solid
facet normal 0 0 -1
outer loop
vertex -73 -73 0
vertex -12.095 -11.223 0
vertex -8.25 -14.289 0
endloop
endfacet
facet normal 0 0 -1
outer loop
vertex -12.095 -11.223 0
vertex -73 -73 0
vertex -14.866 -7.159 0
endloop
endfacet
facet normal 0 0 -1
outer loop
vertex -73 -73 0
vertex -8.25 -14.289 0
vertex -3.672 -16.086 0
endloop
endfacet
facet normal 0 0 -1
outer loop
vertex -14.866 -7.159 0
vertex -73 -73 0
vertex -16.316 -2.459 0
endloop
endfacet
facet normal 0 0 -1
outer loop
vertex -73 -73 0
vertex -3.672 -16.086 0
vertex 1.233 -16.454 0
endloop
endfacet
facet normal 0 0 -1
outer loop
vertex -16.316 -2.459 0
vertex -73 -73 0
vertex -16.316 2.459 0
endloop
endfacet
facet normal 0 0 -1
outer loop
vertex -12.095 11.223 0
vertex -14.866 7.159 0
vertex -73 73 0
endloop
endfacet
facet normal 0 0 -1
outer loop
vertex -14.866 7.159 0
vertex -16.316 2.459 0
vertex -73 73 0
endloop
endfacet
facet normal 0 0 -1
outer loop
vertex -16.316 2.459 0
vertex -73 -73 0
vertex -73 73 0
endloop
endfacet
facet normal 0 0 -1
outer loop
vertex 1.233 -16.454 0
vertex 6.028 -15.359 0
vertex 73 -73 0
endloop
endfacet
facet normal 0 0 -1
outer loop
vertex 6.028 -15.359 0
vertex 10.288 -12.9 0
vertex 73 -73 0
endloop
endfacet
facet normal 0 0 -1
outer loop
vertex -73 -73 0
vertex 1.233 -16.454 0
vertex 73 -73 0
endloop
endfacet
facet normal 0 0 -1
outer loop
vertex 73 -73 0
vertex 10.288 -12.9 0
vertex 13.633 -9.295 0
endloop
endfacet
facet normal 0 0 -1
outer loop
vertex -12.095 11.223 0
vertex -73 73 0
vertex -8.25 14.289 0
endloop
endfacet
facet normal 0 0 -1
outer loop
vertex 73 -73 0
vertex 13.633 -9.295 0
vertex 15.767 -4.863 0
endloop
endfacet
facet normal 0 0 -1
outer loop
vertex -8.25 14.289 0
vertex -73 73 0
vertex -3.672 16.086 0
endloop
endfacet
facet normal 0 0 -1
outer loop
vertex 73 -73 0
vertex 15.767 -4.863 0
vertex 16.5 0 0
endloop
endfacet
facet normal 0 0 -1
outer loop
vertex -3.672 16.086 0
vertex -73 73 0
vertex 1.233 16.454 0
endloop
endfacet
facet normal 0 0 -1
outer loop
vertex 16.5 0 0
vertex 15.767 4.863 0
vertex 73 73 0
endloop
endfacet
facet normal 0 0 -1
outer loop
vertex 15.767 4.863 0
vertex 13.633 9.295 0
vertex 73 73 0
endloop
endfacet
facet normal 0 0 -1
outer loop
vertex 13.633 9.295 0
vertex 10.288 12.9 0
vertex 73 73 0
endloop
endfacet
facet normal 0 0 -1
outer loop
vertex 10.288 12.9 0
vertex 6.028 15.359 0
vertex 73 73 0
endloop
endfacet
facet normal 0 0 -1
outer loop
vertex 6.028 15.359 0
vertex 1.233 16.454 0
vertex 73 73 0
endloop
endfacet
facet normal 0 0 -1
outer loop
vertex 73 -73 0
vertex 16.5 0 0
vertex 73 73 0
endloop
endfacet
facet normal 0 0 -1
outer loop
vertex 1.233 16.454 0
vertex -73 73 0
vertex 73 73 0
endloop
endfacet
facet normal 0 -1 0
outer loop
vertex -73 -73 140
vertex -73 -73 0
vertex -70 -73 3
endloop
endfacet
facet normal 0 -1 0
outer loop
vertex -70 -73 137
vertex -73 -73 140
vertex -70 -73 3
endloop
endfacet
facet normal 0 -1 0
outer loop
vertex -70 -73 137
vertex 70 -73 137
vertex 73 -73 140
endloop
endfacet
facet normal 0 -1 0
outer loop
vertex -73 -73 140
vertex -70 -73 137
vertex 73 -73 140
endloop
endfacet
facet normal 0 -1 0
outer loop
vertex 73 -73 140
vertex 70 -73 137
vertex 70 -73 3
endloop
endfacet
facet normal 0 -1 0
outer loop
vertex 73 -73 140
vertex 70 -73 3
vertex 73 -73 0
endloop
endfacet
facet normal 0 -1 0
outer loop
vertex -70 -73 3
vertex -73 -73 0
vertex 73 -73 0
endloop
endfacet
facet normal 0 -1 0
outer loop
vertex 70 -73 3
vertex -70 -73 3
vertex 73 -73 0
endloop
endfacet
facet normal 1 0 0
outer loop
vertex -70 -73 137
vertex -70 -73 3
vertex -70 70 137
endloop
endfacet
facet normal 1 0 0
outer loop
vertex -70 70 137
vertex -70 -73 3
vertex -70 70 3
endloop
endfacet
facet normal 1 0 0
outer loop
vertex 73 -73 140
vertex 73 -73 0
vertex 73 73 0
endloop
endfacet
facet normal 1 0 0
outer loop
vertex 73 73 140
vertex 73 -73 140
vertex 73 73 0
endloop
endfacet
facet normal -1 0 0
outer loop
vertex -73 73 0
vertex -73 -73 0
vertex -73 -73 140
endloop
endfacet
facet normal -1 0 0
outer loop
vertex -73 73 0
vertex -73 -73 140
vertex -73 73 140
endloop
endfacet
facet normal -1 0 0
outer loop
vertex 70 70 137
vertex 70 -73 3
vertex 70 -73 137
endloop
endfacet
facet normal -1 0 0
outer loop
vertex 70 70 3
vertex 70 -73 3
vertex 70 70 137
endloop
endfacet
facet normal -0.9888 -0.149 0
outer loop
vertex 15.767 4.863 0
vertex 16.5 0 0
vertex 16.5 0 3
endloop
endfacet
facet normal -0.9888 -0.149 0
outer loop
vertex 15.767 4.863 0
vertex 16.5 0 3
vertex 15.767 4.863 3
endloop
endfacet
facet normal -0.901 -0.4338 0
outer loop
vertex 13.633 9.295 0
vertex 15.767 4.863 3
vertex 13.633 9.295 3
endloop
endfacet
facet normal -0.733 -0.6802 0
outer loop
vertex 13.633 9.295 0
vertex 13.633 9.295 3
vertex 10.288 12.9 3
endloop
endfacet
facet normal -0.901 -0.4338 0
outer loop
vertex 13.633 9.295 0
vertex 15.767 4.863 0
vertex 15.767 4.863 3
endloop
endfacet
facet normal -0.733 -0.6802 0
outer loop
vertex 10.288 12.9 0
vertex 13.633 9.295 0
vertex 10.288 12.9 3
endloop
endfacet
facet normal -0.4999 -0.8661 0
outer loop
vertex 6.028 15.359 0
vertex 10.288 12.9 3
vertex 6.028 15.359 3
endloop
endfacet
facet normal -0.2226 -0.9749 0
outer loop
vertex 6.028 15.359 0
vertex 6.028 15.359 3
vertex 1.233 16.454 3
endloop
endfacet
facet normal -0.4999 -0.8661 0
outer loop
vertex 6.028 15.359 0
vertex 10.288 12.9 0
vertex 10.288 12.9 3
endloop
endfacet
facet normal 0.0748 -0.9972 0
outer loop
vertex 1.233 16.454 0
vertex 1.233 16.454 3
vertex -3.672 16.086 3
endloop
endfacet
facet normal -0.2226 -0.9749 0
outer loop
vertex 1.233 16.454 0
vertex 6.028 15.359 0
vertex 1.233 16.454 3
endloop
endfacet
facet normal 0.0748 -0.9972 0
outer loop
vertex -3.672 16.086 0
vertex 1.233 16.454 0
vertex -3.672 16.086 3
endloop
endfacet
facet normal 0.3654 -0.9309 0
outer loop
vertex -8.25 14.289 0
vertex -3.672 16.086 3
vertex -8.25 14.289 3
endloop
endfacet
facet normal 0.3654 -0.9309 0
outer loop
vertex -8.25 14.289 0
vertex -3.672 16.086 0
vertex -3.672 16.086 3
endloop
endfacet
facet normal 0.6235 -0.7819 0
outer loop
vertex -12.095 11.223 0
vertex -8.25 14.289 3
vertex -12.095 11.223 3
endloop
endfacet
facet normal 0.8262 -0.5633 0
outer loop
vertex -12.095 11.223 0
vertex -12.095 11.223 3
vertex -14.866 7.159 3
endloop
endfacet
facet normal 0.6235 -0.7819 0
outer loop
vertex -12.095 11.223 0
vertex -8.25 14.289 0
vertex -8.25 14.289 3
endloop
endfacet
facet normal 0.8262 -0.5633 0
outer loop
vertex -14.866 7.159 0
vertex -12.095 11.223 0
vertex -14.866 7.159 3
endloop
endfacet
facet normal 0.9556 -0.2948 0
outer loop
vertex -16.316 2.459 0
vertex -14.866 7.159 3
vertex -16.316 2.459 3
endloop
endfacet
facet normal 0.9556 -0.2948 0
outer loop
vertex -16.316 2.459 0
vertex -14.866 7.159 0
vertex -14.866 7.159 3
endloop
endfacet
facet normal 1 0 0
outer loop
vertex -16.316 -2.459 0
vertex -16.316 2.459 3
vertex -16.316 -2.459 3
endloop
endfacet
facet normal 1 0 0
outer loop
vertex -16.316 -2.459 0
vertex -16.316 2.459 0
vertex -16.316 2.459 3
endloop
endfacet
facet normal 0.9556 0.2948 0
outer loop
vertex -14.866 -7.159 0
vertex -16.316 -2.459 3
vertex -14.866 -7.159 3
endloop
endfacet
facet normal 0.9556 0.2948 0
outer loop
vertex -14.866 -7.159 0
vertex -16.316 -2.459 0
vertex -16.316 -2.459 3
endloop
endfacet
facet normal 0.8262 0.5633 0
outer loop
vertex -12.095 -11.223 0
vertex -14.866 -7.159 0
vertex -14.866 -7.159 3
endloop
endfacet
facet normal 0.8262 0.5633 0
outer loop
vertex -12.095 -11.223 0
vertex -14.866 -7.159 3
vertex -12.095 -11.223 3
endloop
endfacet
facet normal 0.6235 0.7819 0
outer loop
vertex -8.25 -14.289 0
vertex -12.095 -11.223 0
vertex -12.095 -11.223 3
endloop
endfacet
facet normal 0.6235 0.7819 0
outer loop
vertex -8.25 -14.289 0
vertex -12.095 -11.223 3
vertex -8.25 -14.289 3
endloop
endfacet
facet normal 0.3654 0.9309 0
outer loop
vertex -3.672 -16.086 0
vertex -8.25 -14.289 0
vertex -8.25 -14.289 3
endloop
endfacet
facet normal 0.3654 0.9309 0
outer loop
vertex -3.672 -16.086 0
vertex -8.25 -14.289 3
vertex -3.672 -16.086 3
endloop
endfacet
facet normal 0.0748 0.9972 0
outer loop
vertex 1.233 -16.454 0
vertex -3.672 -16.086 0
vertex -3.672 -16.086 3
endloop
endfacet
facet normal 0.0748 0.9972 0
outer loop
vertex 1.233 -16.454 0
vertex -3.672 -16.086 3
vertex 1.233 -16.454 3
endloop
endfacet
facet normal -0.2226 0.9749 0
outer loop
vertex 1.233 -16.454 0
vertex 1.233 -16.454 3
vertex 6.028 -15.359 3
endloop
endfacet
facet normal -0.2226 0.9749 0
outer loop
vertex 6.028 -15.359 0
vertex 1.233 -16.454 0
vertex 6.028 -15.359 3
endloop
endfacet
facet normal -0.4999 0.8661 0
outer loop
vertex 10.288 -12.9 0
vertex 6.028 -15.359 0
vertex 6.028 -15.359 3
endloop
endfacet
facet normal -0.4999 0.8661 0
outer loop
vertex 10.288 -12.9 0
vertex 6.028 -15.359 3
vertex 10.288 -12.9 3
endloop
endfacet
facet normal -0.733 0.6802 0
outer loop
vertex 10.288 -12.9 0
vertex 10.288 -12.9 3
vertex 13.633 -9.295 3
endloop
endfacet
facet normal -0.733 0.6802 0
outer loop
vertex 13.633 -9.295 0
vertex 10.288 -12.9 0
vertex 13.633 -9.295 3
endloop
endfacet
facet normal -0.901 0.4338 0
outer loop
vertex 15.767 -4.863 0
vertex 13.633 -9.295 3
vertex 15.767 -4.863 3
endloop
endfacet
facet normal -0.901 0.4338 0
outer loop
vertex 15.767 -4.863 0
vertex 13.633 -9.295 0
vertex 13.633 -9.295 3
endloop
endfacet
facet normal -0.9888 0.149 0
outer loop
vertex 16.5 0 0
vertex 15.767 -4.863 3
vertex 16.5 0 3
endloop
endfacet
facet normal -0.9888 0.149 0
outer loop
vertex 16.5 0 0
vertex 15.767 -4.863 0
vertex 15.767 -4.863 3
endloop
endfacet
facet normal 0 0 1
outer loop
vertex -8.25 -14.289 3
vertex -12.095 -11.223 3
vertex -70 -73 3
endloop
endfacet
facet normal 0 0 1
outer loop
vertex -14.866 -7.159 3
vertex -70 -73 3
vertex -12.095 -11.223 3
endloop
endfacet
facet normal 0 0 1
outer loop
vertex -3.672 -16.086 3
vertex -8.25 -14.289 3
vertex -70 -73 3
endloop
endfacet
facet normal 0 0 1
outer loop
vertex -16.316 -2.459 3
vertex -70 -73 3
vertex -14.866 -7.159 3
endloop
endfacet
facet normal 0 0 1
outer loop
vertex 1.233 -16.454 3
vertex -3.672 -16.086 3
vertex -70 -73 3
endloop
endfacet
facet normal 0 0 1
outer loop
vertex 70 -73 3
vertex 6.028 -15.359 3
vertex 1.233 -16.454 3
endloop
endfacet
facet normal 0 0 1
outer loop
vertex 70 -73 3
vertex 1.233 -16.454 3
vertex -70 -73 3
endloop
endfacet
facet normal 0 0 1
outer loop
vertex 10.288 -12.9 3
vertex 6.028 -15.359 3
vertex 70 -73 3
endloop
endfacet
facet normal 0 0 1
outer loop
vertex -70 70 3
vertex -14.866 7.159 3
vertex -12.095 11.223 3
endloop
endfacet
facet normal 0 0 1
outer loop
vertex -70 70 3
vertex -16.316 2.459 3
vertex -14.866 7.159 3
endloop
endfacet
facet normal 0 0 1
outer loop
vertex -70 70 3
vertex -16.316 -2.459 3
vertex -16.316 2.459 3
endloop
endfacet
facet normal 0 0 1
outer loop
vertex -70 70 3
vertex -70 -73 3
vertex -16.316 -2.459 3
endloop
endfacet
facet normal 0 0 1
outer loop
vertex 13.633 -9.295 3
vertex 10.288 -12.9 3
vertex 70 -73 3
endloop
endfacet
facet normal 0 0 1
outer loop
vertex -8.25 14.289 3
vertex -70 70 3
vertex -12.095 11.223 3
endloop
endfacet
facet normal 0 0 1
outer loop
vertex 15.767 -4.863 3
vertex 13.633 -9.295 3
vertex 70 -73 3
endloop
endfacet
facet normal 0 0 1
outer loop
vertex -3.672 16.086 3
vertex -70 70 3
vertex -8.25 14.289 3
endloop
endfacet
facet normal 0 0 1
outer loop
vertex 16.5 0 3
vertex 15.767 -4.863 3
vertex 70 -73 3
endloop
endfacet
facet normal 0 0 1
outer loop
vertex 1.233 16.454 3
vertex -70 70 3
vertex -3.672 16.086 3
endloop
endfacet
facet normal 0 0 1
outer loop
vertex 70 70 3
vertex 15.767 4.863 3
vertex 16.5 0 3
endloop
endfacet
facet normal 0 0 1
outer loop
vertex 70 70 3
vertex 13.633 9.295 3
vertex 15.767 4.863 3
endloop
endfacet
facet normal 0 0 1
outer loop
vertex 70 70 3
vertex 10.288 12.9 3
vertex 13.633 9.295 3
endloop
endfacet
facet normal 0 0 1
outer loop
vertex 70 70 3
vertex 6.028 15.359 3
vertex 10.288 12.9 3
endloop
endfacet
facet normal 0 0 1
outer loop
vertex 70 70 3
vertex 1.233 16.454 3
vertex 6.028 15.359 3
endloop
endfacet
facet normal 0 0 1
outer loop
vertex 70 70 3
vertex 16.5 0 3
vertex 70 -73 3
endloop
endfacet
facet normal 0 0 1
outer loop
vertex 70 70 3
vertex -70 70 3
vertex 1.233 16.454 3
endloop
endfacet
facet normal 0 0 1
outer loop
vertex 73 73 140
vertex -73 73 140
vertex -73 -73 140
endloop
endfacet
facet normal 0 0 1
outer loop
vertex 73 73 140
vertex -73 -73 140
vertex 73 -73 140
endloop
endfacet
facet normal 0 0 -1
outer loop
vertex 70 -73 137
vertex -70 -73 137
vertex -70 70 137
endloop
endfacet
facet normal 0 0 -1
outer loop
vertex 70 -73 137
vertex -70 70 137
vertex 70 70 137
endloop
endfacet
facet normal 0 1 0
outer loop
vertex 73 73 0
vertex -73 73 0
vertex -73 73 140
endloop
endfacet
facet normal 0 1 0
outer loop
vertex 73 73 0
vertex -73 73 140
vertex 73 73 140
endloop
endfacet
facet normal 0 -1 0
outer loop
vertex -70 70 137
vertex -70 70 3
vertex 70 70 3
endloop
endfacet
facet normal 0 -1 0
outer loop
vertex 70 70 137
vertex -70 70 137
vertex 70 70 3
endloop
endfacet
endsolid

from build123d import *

# Parameters (mm, degrees)
F0_W     = 146
F0_H     = 146
F0_R     = 16.5
F1_DEPTH = 140
F2_T     = -3
F3_DEPTH = 3


with BuildPart() as f1:
    # F0 (on Top) → F1 (new body)
    with BuildSketch(Plane.XY):
        Rectangle(F0_W, F0_H)
        Circle(F0_R, mode=Mode.SUBTRACT)
        Circle(F0_R)
    extrude(amount=F1_DEPTH)

    # F2
    f2_openings = [f1.faces().sort_by_distance(p)[0] for p in [
        (0, -73, 70),
    ]]
    offset(amount=F2_T, openings=f2_openings)

    # F0 (on Top) → F3 (cut)
    with BuildSketch(Plane.XY):
        Circle(F0_R)
    extrude(amount=F3_DEPTH, mode=Mode.SUBTRACT)


solid = f1.part
